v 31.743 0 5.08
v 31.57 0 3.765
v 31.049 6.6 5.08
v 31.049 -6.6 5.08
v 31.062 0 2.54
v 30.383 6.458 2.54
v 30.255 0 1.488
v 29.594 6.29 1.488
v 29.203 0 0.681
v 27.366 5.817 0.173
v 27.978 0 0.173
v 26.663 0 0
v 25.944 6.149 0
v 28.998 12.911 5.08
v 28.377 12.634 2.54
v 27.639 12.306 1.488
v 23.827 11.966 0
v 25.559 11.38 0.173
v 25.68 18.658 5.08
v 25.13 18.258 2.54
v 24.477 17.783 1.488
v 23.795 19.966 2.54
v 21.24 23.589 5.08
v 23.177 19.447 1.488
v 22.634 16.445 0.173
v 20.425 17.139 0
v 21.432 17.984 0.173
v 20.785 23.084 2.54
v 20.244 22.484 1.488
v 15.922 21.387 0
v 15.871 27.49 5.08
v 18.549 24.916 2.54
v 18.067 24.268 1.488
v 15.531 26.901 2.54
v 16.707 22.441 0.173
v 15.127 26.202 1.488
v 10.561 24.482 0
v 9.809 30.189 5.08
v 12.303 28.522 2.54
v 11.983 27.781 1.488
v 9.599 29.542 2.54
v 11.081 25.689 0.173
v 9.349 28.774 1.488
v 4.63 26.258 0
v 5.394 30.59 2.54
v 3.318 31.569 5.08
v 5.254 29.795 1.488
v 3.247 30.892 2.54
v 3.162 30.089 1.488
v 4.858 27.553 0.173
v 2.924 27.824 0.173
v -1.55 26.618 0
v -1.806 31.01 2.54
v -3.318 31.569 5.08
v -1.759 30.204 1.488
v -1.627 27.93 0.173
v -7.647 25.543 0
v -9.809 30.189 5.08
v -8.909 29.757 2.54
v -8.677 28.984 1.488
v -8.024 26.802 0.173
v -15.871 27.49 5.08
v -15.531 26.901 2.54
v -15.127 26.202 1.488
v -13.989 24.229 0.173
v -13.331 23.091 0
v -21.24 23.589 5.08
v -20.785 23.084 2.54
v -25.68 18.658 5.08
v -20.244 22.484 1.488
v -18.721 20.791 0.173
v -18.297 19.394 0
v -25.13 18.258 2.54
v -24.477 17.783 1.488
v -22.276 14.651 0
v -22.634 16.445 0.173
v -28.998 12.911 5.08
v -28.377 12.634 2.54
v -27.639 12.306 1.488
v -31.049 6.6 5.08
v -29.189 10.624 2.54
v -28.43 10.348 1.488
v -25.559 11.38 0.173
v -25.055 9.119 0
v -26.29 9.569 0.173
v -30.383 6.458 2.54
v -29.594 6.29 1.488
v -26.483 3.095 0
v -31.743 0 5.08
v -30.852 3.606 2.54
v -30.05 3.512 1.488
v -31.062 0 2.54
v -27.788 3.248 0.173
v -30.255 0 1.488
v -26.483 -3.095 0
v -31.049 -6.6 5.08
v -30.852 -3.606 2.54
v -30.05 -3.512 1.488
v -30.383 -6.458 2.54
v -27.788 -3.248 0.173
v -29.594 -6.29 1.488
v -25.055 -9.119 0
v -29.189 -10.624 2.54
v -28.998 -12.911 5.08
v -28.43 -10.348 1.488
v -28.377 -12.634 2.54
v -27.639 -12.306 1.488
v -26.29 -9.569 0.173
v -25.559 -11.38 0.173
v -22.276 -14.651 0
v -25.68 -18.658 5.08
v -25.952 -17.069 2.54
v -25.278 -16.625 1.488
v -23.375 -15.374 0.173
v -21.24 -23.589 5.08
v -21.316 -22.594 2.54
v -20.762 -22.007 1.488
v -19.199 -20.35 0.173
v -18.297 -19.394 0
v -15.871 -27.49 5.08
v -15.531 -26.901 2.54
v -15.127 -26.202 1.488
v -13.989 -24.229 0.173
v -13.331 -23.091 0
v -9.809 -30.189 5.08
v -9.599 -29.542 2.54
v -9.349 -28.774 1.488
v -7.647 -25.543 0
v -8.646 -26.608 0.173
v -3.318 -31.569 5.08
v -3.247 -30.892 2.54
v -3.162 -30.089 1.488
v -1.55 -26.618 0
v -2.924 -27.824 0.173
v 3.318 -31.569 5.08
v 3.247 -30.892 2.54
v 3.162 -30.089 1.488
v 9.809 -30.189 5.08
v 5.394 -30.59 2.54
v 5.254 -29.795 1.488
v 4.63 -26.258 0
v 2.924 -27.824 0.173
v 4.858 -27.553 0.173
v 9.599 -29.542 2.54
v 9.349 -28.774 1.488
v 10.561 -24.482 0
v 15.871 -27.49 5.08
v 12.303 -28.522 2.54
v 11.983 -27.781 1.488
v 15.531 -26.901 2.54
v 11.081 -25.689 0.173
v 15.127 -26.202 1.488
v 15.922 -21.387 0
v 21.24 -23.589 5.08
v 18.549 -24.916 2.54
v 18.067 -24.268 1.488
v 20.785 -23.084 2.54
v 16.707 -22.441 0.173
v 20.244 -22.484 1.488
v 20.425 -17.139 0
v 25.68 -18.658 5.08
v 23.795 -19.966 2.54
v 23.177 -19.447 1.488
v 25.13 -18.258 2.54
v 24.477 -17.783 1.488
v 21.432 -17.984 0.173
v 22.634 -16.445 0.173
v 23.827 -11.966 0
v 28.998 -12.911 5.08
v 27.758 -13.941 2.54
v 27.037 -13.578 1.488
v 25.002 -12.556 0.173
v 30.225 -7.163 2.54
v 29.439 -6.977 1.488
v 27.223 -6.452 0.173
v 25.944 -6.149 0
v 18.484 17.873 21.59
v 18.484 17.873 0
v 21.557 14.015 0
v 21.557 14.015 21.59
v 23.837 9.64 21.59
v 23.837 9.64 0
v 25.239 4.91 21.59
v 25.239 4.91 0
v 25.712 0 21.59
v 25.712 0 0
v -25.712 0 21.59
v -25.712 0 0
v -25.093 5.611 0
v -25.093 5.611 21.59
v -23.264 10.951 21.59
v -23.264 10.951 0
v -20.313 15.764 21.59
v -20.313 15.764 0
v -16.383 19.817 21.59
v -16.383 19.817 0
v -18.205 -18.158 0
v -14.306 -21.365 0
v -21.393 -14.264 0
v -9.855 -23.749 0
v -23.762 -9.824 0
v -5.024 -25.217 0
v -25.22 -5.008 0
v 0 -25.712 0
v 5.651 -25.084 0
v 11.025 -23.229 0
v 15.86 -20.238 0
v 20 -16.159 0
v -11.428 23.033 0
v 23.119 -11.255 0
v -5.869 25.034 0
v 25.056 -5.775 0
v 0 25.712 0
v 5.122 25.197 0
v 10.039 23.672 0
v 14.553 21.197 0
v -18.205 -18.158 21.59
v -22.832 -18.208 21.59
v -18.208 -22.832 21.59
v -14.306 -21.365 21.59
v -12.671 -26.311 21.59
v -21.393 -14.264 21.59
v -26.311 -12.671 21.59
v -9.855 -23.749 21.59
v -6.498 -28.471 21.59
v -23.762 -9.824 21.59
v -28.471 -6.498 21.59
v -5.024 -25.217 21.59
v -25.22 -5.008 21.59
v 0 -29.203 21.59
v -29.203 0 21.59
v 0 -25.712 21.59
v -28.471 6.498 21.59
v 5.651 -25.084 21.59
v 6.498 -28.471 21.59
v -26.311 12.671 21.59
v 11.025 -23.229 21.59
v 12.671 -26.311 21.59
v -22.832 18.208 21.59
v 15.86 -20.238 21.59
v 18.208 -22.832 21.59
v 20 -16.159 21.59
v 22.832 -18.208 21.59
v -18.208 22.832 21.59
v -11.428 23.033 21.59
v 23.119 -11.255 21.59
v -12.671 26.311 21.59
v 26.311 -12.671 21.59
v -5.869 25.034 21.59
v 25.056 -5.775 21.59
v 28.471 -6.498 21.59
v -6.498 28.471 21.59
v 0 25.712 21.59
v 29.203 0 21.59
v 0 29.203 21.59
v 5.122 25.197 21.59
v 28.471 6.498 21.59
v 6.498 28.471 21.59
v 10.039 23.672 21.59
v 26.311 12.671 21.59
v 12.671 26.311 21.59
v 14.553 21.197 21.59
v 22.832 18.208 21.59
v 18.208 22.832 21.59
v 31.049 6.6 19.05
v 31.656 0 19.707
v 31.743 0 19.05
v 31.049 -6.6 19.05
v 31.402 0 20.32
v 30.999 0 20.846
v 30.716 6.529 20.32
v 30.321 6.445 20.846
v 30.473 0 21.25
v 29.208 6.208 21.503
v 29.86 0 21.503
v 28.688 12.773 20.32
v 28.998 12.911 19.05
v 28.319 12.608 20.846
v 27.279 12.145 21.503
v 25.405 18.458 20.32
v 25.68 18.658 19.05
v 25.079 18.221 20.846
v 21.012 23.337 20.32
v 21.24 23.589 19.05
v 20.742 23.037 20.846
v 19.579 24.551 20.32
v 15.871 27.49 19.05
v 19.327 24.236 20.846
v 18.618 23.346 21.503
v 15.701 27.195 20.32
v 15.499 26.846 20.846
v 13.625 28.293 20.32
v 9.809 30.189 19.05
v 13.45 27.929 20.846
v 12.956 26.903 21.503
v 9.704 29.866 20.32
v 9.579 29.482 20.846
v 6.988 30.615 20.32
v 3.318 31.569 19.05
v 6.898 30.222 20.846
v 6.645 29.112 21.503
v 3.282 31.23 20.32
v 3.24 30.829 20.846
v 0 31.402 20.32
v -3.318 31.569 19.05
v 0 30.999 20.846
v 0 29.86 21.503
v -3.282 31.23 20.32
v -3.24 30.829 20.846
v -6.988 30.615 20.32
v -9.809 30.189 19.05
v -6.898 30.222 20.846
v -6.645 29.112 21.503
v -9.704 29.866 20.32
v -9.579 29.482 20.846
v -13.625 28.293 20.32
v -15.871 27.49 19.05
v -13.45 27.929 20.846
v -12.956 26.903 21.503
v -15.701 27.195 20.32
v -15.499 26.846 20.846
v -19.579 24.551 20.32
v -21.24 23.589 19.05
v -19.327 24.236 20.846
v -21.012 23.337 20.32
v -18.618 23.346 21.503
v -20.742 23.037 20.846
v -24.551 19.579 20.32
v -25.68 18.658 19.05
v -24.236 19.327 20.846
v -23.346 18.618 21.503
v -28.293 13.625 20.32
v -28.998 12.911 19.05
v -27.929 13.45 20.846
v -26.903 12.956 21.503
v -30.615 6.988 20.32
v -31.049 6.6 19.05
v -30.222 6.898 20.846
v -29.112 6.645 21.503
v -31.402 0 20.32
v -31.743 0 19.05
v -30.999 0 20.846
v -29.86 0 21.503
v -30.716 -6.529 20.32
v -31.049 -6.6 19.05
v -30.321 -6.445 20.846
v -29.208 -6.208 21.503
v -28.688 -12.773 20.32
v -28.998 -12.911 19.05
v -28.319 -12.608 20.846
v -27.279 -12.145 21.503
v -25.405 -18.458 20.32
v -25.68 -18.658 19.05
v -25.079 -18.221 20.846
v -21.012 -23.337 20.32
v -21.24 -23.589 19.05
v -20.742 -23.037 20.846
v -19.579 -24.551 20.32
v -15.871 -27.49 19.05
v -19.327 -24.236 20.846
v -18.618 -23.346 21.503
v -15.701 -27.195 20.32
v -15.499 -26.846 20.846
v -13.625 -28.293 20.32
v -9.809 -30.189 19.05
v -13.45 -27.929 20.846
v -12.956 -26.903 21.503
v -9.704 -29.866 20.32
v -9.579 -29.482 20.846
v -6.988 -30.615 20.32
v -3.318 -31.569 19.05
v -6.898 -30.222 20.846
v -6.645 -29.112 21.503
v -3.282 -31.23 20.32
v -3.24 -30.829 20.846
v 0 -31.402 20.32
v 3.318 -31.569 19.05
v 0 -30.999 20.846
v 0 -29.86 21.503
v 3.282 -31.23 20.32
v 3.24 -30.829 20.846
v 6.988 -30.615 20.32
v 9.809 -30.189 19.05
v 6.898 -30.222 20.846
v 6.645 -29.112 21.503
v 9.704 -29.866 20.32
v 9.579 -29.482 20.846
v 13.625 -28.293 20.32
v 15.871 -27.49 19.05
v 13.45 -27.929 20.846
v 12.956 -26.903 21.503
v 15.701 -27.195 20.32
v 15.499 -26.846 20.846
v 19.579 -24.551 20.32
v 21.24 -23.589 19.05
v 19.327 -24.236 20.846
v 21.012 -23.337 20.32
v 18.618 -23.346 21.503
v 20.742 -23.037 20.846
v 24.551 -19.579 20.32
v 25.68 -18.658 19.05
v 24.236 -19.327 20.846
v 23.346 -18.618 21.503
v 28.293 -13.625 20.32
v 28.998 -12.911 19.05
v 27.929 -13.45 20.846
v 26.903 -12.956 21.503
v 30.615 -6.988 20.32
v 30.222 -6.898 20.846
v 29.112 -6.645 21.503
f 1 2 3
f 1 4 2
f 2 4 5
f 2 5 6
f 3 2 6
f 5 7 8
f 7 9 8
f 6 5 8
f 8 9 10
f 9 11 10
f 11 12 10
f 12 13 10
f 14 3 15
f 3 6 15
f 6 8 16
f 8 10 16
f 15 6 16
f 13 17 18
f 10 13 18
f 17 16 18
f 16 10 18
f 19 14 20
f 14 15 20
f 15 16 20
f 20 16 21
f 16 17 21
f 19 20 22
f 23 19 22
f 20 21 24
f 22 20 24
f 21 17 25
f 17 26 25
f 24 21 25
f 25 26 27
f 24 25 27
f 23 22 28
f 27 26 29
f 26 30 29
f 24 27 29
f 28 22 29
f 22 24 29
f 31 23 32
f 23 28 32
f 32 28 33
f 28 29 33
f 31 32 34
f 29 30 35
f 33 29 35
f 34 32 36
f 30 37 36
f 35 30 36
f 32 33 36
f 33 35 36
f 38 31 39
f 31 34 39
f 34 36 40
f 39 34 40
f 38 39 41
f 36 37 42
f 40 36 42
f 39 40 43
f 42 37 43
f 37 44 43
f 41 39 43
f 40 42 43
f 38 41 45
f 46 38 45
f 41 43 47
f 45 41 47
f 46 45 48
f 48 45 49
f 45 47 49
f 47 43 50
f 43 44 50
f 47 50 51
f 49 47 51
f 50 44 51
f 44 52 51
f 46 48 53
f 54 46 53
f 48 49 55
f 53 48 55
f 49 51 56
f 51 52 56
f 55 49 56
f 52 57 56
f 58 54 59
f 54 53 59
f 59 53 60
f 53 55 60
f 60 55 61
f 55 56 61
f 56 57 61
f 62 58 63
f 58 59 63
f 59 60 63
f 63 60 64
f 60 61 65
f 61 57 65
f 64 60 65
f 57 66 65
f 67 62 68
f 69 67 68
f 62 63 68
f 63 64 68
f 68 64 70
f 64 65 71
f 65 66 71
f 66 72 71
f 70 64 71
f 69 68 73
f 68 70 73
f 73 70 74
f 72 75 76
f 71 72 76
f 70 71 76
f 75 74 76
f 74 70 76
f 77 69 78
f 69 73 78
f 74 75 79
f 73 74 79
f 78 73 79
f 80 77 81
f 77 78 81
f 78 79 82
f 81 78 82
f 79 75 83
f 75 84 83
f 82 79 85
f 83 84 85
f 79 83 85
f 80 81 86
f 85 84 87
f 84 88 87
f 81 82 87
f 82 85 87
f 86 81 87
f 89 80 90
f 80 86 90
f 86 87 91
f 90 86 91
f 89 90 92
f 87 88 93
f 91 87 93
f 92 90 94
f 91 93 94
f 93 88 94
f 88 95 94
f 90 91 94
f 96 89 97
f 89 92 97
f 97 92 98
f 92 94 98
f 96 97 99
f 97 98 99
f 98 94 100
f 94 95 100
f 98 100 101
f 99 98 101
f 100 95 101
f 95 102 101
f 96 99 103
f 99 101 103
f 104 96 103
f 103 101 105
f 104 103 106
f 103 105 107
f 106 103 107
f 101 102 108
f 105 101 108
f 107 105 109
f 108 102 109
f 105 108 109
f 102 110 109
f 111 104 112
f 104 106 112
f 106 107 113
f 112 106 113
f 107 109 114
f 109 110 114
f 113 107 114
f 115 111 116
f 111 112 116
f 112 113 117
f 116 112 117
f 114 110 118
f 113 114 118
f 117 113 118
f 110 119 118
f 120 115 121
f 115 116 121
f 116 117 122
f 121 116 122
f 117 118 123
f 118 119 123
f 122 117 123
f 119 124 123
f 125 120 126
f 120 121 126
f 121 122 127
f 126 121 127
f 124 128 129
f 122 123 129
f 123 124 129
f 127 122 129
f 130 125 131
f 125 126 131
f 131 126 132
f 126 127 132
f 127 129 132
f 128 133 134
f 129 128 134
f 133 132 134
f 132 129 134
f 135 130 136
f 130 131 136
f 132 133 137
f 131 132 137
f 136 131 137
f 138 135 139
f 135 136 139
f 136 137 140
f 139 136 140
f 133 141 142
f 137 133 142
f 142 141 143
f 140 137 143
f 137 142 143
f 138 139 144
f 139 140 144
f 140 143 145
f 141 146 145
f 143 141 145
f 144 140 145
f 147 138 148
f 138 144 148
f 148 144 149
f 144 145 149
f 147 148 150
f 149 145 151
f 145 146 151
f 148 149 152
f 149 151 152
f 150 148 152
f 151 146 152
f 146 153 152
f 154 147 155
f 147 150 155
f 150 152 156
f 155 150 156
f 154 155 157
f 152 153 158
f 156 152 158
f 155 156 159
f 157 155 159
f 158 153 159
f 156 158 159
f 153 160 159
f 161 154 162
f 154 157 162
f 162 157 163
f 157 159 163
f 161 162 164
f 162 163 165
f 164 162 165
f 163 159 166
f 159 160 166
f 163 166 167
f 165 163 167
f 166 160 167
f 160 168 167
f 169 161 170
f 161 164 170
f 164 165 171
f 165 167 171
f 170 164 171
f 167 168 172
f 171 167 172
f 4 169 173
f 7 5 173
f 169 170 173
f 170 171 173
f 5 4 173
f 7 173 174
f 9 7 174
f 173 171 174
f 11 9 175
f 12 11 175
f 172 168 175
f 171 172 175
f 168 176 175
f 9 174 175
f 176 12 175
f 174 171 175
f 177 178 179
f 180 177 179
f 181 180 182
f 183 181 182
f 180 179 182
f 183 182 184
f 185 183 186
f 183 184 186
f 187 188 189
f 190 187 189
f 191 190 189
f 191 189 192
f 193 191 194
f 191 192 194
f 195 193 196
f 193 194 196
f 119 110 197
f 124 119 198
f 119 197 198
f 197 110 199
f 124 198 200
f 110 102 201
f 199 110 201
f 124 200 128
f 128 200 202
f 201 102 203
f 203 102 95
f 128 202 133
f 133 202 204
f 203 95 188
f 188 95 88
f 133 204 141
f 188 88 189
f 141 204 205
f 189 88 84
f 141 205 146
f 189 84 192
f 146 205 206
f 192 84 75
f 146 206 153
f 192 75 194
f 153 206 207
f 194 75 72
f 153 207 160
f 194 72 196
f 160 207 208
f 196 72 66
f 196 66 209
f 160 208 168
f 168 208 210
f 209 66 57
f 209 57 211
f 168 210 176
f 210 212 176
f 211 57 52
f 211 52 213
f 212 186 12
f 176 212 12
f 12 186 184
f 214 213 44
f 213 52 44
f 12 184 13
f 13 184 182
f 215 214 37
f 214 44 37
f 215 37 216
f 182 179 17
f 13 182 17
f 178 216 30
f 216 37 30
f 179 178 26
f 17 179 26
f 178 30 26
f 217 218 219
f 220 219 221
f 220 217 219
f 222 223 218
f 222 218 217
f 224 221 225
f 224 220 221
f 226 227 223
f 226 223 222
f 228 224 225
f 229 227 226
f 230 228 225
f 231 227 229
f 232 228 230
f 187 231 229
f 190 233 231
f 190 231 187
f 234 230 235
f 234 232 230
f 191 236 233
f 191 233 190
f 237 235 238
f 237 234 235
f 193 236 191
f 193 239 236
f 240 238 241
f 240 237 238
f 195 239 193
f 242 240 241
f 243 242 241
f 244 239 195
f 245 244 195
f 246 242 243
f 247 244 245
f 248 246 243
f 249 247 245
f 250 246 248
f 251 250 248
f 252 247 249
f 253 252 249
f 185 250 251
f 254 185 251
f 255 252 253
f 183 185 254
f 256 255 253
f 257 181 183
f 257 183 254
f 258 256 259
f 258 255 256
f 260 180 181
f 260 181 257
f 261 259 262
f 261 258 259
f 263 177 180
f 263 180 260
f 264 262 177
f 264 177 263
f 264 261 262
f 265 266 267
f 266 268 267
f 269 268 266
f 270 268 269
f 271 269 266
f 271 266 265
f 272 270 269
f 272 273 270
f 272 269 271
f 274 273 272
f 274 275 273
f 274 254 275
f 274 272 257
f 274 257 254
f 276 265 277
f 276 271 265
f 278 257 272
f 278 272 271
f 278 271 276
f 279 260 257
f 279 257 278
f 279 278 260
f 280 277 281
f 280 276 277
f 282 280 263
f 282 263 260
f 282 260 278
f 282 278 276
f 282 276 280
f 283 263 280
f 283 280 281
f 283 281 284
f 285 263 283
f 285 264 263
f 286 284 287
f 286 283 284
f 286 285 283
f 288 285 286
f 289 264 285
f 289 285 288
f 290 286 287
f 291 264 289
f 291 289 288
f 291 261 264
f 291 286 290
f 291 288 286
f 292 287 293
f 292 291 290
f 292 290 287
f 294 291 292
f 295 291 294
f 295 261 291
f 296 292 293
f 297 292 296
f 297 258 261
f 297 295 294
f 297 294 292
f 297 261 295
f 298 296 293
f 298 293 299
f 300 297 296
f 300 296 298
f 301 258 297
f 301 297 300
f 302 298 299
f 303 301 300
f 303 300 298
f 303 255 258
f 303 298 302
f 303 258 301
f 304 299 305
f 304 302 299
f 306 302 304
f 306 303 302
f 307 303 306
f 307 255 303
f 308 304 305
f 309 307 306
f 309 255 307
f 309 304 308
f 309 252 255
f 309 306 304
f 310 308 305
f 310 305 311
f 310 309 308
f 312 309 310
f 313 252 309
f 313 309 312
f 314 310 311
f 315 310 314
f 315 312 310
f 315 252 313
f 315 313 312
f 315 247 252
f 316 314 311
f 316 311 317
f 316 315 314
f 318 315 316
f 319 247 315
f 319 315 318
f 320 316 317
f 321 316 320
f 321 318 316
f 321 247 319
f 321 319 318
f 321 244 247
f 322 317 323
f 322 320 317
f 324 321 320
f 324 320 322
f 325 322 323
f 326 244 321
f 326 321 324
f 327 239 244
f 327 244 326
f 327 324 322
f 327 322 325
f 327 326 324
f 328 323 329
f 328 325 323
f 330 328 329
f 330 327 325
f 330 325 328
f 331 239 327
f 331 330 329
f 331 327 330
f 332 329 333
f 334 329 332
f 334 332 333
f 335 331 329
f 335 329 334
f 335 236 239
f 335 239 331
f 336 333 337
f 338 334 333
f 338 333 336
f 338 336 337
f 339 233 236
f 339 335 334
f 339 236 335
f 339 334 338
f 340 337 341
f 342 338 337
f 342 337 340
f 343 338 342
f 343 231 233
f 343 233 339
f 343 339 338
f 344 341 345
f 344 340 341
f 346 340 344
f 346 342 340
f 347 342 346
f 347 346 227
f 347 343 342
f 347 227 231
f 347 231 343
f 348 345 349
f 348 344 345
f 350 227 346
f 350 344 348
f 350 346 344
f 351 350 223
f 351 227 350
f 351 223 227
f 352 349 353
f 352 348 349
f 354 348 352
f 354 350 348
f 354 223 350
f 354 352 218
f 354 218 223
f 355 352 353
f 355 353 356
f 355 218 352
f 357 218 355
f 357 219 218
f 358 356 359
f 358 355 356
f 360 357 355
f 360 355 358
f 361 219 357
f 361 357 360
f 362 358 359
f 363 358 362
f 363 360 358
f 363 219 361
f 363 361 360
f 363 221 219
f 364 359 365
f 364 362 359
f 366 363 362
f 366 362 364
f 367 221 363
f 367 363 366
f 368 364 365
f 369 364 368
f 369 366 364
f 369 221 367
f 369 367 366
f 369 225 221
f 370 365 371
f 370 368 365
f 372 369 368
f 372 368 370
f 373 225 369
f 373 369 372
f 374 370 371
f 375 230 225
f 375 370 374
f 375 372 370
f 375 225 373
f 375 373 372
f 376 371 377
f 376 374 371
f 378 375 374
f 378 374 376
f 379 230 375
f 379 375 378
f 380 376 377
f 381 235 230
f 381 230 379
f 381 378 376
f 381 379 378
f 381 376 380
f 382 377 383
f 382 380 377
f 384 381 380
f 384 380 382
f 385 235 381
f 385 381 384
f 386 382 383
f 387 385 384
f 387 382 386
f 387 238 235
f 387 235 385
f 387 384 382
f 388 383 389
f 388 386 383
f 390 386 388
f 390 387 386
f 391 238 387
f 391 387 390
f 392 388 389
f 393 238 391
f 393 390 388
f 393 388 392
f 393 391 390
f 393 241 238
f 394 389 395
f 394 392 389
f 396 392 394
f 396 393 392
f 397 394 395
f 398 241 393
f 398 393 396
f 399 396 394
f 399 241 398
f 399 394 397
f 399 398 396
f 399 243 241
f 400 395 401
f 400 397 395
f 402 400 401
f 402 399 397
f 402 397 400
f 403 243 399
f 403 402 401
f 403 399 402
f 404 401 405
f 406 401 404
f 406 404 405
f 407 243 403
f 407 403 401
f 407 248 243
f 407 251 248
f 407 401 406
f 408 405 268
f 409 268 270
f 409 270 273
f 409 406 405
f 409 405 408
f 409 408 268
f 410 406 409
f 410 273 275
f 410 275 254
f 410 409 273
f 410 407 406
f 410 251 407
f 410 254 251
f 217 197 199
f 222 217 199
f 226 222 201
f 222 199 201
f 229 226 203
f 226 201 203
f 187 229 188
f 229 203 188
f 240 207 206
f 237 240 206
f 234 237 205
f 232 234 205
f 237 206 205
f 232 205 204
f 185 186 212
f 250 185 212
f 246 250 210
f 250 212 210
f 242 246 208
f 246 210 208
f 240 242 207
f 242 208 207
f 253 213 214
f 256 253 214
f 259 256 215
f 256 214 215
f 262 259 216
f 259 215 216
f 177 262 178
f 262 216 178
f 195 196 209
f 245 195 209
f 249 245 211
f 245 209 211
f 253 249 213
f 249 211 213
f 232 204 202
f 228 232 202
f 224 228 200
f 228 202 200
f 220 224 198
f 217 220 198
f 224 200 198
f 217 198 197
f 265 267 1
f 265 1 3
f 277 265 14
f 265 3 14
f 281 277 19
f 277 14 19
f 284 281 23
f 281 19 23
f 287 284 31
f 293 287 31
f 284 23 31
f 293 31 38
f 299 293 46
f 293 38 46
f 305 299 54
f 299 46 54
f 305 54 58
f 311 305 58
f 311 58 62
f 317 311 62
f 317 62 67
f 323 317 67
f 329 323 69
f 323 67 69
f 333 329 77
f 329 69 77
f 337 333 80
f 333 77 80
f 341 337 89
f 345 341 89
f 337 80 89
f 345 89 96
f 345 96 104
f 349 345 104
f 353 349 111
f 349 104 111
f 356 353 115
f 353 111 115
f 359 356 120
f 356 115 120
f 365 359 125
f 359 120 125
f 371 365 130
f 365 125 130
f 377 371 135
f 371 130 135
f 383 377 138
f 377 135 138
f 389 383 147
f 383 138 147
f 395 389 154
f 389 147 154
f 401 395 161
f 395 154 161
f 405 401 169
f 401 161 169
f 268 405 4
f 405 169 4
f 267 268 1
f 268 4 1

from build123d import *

# Parameters (mm, degrees)
F0_R     = 31.742786
F1_DEPTH = 21.59
F2_R     = 5.08
F3_R     = 2.54


with BuildPart() as f1:
    # F0 (on Top) → F1 (new body)
    with BuildSketch(Plane.XY):
        Circle(F0_R)
        with BuildLine():
            ThreePointArc((18.484382, 17.87337), (23.837034, 9.63979), (25.712443, 0))
            ThreePointArc((25.712443, 0), (23.118518, -11.254504), (15.860104, -20.238252))
            ThreePointArc((15.860104, -20.238252), (8.389125, -24.305397), (0, -25.712443))
            ThreePointArc((0, -25.712443), (-9.855162, -23.748801), (-18.205059, -18.157797))
            ThreePointArc((-18.205059, -18.157797), (-23.76159, -9.824286), (-25.712443, 0))
            ThreePointArc((-25.712443, 0), (-23.263593, 10.951483), (-16.383499, 19.81693))
            ThreePointArc((-16.383499, 19.81693), (-8.705977, 24.193712), (0, 25.712443))
            ThreePointArc((0, 25.712443), (10.038967, 23.671689), (18.484382, 17.87337))
        make_face(mode=Mode.SUBTRACT)
    extrude(amount=F1_DEPTH)

    # F2
    f2_edges = [f1.edges().sort_by_distance(p)[0] for p in [
        (-31.742786, 0, 0),
    ]]
    fillet(f2_edges, radius=F2_R)

    # F3
    f3_edges = [f1.edges().sort_by_distance(p)[0] for p in [
        (-31.742786, 0, 21.59),
    ]]
    fillet(f3_edges, radius=F3_R)


solid = f1.part
